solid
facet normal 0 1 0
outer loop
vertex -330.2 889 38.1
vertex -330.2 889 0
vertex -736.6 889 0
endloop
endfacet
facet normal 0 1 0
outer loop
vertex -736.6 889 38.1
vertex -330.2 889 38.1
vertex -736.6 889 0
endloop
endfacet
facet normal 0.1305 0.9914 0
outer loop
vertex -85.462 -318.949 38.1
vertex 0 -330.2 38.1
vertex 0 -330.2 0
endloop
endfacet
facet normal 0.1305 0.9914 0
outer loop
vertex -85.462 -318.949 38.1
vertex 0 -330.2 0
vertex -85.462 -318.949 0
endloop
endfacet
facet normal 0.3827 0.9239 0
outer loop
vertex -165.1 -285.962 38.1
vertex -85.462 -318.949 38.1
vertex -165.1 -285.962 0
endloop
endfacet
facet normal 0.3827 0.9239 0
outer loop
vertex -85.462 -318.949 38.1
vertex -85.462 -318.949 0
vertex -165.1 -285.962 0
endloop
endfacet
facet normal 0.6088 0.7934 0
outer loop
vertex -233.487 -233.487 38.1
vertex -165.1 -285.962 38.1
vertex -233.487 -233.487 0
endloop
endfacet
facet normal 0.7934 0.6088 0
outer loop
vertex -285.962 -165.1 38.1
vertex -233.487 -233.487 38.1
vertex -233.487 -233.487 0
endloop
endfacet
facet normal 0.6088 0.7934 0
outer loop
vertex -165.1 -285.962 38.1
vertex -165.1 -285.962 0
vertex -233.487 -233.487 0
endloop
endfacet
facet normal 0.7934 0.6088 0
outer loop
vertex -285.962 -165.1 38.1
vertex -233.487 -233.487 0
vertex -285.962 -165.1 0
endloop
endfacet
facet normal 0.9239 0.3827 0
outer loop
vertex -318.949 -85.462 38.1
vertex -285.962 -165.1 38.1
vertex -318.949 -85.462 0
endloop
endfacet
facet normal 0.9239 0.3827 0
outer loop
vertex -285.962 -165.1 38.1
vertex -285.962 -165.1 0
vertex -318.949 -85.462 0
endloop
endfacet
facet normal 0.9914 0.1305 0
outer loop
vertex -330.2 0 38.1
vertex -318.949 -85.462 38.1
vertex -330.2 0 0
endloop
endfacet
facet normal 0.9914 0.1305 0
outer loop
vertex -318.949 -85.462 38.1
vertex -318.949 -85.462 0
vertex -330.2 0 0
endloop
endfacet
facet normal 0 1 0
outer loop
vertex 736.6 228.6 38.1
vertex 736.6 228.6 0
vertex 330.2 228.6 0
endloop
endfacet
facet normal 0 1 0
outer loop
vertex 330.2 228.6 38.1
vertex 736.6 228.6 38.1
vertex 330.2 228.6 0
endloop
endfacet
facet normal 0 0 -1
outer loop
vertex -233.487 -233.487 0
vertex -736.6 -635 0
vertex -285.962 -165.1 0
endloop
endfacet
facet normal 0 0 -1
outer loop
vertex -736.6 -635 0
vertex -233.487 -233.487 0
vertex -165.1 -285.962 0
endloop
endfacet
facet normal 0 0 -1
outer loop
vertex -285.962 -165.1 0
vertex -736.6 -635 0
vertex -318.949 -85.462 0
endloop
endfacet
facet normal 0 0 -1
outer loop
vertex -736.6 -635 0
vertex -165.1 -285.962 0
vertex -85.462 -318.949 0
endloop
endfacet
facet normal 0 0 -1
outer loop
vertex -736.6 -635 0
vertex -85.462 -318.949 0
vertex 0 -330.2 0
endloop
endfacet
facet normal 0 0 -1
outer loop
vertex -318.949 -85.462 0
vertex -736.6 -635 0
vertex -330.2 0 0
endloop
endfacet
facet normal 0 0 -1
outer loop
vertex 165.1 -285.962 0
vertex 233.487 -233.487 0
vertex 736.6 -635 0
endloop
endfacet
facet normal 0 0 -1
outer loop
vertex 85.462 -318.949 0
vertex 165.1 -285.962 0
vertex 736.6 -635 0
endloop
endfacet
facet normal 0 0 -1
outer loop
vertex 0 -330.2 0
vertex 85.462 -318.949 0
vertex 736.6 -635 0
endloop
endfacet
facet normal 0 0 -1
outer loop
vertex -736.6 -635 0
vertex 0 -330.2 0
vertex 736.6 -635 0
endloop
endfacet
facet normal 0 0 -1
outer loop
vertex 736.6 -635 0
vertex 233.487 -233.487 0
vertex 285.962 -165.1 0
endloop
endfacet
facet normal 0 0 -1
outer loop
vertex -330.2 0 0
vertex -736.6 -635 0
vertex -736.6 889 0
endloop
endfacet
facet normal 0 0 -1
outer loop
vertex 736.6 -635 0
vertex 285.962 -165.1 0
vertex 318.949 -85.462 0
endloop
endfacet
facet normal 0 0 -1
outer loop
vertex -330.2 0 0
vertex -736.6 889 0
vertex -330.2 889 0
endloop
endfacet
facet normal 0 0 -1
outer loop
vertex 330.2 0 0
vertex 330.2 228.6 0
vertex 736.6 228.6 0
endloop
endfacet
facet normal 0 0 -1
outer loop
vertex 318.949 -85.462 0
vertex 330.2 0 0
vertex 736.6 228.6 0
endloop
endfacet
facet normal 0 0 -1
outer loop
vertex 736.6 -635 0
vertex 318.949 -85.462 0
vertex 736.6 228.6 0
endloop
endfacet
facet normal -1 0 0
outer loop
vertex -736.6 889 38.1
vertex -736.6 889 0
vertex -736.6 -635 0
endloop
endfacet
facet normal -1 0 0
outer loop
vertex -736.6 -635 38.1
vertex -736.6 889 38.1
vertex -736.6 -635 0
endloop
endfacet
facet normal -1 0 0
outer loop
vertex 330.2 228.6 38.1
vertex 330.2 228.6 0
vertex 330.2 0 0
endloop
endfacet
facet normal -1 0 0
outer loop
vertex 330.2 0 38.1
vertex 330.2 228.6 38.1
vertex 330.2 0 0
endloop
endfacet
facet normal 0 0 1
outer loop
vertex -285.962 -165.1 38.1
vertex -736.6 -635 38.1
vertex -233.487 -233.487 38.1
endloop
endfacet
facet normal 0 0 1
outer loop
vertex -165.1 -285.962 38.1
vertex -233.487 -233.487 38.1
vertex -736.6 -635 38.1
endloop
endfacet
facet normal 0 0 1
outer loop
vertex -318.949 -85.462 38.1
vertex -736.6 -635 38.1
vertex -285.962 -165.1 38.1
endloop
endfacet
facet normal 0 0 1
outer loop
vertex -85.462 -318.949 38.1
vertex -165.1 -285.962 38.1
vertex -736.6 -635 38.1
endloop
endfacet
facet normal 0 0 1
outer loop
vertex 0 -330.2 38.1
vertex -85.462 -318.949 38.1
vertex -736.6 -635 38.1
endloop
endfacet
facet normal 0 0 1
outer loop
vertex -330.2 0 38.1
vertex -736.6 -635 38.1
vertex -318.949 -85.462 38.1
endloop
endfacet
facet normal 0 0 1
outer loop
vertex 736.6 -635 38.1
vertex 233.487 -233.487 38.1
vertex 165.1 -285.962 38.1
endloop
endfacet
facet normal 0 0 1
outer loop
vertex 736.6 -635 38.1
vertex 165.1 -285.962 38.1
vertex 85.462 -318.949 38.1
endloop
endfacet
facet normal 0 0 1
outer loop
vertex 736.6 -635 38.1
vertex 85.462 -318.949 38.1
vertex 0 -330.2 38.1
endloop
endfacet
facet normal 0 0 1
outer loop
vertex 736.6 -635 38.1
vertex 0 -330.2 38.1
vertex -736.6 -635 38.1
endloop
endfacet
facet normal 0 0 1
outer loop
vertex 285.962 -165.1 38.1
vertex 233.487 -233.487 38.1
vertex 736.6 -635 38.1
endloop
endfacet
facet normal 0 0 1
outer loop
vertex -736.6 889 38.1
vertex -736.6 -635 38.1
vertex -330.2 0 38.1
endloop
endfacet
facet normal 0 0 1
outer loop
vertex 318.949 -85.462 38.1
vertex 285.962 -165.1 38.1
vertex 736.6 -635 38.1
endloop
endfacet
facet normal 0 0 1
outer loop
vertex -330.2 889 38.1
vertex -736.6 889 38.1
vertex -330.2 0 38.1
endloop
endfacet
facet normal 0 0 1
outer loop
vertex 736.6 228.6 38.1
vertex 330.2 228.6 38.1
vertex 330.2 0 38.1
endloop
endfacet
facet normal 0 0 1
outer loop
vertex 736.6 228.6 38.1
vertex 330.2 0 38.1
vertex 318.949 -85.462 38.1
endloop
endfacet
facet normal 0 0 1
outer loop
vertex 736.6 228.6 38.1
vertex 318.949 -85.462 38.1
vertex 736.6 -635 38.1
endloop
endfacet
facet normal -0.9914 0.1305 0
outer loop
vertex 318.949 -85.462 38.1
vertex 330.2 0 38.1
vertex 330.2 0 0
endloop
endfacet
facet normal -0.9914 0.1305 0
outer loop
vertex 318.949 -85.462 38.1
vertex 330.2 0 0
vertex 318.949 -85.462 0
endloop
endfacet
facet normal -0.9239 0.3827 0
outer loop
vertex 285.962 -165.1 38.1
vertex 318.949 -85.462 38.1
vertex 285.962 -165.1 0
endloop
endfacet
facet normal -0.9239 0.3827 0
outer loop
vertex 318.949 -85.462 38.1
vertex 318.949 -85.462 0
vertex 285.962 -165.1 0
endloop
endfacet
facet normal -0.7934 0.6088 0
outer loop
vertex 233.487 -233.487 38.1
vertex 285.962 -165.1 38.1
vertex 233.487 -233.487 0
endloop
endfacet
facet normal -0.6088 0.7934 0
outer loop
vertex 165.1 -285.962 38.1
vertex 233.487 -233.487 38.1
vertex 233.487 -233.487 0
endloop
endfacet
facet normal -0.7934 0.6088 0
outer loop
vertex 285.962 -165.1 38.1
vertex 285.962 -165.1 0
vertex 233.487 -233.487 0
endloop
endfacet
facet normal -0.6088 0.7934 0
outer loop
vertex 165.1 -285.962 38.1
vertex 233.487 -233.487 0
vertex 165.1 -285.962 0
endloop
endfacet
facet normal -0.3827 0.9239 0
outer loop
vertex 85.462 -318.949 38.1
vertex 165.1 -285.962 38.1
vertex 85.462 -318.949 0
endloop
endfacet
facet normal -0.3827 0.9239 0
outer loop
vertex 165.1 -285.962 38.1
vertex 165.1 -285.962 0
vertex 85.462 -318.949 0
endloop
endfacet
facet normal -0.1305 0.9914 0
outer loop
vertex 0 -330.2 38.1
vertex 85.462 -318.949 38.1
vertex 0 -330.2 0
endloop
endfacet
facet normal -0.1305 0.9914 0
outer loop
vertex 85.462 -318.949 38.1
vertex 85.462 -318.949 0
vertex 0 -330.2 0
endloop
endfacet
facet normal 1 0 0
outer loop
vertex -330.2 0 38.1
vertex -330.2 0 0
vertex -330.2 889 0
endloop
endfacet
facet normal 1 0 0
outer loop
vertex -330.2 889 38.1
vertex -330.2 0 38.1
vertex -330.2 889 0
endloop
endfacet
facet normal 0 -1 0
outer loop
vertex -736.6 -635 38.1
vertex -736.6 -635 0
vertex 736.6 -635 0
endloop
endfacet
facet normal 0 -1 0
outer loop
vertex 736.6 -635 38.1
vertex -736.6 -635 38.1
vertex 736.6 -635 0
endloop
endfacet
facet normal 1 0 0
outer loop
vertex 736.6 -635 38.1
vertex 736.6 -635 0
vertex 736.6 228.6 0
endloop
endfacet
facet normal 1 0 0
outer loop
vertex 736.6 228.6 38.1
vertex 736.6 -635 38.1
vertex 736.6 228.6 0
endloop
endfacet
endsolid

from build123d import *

# Parameters (mm, degrees)
F1_DEPTH = 38.1


with BuildPart() as f1:
    # F0 (on Top) → F1 (new body)
    with BuildSketch(Plane.XY):
        with BuildLine():
            ThreePointArc((0, -330.2), (-233.486659, -233.486659), (-330.2, 0))
            Line((-330.2, 0), (-330.2, 889))
            Line((-330.2, 889), (-736.6, 889))
            Line((-736.6, 889), (-736.6, -635))
            Line((-736.6, -635), (736.6, -635))
            Line((736.6, -635), (736.6, 228.6))
            Line((736.6, 228.6), (330.2, 228.6))
            Line((330.2, 228.6), (330.2, 0))
            ThreePointArc((330.2, 0), (233.486659, -233.486659), (0, -330.2))
        make_face()
    extrude(amount=F1_DEPTH)


solid = f1.part
